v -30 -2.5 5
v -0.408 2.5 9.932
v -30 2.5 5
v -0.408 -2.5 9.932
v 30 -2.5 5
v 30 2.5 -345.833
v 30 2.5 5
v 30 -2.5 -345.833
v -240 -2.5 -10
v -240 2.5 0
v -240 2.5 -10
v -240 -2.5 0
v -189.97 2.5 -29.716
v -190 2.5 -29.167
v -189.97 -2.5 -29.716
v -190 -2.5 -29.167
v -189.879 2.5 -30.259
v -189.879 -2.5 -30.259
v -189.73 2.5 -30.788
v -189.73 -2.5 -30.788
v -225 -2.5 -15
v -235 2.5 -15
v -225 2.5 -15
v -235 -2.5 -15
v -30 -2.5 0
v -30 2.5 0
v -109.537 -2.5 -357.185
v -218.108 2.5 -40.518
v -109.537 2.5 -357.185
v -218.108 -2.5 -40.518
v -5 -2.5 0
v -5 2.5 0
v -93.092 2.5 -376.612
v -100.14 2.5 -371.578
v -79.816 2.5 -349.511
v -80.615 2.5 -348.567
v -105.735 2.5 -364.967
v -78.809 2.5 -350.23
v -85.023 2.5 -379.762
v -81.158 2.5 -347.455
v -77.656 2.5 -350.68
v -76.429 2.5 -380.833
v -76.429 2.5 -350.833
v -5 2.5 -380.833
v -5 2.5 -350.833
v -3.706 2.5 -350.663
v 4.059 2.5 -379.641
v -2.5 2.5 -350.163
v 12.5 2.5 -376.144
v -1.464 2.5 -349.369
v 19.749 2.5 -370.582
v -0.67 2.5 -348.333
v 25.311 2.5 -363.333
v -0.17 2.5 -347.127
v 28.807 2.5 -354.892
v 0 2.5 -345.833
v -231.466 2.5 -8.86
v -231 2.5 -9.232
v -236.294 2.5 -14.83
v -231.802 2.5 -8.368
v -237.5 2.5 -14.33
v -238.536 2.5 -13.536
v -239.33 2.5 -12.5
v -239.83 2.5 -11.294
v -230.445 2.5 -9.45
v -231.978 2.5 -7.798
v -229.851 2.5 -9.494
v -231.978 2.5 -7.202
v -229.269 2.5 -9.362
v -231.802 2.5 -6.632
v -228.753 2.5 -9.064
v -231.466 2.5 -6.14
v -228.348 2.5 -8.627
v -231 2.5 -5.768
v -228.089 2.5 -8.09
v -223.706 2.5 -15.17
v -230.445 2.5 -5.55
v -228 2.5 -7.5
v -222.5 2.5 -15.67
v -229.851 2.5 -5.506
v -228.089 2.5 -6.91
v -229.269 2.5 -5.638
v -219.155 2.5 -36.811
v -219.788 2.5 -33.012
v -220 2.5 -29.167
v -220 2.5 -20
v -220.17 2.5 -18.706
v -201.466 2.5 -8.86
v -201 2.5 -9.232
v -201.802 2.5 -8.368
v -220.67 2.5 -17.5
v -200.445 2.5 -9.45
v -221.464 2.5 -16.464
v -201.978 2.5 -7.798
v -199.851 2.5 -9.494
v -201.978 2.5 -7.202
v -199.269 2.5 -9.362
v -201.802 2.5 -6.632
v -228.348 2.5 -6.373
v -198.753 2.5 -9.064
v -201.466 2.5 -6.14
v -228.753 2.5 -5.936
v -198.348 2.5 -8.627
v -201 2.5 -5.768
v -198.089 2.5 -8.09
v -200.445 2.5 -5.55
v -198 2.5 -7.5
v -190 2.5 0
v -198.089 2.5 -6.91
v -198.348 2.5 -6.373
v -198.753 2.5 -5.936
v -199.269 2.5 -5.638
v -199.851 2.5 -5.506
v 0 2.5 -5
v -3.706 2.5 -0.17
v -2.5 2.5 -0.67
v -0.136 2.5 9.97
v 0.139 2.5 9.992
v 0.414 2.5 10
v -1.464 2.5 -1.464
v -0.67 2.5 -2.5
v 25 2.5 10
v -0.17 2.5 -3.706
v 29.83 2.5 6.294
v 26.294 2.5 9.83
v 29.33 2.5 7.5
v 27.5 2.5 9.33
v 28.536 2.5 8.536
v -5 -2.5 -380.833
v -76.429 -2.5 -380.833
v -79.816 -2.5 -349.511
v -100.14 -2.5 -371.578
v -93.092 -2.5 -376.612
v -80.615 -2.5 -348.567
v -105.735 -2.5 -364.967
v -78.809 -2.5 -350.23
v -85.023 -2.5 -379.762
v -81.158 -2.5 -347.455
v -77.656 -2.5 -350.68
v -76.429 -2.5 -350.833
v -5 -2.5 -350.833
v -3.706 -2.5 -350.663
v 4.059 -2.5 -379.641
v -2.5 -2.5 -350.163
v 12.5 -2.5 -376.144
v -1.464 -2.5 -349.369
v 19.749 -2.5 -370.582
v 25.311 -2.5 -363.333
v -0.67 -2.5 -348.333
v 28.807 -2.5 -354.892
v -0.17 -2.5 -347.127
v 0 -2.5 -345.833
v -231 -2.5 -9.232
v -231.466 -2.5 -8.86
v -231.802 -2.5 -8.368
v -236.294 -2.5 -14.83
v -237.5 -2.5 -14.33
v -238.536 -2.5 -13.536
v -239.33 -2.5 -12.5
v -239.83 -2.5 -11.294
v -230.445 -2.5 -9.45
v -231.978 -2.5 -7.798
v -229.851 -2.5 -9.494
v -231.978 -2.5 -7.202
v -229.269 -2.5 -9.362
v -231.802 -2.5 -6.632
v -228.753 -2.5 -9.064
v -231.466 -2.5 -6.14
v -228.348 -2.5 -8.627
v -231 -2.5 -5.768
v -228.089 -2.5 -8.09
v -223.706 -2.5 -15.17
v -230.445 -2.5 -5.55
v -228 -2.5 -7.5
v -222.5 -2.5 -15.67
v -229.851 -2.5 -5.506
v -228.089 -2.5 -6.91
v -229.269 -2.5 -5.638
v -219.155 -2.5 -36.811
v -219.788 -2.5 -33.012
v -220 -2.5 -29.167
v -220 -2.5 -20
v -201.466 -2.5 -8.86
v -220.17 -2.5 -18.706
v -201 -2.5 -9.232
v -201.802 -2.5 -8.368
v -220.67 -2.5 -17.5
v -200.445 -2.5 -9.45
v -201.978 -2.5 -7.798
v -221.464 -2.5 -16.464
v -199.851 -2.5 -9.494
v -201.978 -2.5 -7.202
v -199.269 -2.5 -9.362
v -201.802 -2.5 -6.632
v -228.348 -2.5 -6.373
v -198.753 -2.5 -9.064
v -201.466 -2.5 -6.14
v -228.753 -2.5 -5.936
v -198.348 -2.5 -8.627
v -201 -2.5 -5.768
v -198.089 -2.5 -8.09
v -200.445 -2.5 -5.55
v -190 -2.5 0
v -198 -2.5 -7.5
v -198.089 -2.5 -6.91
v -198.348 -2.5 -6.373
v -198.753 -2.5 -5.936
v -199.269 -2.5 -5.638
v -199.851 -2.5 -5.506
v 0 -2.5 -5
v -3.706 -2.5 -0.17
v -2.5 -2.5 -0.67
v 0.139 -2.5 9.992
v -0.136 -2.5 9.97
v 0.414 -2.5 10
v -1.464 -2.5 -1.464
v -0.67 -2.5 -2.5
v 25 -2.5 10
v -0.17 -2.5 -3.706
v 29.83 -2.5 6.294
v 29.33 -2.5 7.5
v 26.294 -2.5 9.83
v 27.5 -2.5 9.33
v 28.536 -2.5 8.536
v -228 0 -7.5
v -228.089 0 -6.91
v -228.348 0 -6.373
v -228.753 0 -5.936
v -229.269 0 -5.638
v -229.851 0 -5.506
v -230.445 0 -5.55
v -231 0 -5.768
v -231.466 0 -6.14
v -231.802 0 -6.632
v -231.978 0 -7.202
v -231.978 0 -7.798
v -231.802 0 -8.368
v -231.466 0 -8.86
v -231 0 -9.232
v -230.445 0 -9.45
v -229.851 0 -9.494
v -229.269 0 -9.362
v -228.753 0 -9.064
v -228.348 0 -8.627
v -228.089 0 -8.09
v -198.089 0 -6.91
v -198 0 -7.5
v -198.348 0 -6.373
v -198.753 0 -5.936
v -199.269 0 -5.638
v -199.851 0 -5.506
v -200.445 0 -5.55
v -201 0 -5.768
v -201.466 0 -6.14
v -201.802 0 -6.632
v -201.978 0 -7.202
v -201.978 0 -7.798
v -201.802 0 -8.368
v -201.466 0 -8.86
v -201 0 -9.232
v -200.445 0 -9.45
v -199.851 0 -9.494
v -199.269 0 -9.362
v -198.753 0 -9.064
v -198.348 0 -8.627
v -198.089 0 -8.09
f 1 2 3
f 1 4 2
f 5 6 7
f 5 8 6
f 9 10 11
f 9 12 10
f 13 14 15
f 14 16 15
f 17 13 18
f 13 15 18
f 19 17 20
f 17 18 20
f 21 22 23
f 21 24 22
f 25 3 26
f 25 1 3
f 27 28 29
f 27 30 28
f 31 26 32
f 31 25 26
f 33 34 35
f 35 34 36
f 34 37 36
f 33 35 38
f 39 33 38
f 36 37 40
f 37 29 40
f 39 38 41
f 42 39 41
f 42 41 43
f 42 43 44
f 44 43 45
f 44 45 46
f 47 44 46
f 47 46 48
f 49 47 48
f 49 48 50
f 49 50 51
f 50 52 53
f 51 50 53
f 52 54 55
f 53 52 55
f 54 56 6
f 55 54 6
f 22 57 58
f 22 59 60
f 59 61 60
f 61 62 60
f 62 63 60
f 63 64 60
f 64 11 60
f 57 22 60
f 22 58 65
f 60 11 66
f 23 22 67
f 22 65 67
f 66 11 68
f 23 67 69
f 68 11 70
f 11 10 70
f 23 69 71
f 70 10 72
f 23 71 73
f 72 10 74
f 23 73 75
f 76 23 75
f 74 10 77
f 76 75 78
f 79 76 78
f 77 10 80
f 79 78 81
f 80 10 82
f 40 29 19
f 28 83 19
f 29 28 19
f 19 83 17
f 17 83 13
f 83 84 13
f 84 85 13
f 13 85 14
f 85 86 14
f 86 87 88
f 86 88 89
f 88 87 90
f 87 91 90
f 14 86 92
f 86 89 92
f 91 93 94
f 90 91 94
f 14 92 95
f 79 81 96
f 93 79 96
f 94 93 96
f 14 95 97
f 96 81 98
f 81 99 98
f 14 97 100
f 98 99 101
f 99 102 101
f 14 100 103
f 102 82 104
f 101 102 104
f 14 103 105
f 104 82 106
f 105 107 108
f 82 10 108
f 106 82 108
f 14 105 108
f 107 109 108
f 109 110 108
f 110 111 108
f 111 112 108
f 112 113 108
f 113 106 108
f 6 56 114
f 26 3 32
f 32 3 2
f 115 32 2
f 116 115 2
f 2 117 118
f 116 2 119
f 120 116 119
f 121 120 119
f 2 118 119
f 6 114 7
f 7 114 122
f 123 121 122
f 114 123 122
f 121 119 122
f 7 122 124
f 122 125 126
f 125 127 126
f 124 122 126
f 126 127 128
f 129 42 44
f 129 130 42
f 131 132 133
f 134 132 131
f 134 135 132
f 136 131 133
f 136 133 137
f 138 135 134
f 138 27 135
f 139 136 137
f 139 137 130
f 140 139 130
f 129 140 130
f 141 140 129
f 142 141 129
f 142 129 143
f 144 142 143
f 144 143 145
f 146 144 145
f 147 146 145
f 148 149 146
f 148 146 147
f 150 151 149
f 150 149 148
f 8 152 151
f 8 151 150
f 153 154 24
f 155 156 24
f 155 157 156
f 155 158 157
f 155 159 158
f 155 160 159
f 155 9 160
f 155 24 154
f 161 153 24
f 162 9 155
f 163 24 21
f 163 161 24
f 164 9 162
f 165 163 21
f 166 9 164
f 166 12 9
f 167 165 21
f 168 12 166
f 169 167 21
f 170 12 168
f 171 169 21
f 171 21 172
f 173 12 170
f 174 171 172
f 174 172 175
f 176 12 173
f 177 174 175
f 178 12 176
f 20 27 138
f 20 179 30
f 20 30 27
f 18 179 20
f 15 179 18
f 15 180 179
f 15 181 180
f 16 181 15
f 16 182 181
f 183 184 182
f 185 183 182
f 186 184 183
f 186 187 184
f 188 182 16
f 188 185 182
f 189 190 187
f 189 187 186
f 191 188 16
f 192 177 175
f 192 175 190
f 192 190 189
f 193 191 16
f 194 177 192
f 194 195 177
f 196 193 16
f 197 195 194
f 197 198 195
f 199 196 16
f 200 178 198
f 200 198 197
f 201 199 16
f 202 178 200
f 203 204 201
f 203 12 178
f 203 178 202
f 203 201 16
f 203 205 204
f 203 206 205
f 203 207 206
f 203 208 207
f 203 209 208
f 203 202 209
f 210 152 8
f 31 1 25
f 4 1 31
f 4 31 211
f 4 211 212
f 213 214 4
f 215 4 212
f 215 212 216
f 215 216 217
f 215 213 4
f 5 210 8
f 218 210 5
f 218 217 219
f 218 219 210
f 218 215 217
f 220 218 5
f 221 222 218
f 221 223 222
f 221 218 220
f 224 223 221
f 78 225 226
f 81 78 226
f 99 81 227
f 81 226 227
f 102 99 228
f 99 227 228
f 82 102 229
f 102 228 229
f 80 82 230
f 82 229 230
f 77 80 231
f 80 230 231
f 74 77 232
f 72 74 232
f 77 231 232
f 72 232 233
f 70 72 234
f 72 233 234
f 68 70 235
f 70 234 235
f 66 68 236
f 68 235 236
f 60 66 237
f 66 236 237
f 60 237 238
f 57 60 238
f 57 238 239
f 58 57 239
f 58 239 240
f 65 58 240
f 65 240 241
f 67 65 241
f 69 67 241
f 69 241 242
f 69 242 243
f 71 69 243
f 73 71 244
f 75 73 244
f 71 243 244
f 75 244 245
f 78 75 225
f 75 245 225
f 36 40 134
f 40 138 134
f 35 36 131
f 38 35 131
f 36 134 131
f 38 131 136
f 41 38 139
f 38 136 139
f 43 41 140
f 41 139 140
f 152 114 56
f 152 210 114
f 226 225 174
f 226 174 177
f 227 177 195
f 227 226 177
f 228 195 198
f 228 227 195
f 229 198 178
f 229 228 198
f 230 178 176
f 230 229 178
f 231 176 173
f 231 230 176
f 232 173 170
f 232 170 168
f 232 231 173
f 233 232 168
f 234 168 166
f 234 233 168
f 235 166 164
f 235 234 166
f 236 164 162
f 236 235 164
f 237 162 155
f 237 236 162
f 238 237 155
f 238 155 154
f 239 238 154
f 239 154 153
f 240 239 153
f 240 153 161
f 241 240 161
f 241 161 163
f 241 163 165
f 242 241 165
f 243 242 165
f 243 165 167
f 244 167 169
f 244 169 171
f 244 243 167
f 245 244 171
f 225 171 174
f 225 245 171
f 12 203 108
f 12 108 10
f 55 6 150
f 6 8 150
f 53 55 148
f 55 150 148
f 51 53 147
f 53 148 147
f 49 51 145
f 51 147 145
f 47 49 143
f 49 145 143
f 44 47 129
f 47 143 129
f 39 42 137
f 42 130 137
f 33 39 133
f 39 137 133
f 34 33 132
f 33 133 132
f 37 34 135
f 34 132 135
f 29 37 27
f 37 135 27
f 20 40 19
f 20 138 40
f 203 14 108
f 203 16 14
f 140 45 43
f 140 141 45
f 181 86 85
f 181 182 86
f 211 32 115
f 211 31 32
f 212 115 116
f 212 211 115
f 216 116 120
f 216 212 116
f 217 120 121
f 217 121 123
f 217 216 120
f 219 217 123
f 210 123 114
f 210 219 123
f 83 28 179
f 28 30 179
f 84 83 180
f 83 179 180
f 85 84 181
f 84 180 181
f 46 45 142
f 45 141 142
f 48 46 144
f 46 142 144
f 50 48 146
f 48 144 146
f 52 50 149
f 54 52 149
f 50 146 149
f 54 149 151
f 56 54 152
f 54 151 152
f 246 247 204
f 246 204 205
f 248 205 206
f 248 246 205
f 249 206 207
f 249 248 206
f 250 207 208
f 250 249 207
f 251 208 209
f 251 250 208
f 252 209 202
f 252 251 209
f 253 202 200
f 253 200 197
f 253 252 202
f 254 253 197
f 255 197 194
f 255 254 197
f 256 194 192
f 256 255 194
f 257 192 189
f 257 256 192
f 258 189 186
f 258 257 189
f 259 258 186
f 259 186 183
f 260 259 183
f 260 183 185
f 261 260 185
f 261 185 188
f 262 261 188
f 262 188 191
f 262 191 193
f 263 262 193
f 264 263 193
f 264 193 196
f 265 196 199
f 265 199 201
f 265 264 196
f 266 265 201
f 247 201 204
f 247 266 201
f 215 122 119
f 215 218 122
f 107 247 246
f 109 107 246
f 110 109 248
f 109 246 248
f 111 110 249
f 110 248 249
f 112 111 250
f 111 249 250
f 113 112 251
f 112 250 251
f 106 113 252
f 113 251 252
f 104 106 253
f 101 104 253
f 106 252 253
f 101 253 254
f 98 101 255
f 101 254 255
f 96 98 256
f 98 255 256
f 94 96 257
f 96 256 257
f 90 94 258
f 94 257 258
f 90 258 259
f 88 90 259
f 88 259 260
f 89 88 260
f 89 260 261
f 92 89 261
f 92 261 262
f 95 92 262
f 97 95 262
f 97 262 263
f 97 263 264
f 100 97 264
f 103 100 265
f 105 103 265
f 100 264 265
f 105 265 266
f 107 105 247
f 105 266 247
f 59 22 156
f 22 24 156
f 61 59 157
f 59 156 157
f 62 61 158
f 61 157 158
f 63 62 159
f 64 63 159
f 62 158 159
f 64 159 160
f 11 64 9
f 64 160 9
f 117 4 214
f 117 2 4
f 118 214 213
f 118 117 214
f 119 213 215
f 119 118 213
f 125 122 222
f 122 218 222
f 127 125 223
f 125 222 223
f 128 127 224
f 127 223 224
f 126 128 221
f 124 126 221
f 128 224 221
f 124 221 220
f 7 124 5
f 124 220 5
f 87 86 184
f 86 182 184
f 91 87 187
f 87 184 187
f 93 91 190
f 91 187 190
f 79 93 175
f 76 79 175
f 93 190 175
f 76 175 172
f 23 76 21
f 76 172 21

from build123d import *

# Parameters (mm, degrees)
F1_DEPTH      = 2.5
F2_R          = 5
F3_R          = 35
F4_R          = 2
F5_DEPTH      = 2.5
F5_DEPTH_BACK = 2.5


with BuildPart() as f1:
    # F0 (on Front) → F1 (new body, symmetric)
    with BuildSketch(Plane.XZ):
        Polygon((-30, 0), (0, 0), (0, -350.8333333333), (-80, -350.8333333333), (-190, -30), (-190, 0), (-240, 0), (-240, -15), (-220, -15), (-220, -35), (-101.4285714286, -380.8333333333), (30, -380.8333333333), (30, 10), (0, 10), (-30, 5), align=None)
    extrude(amount=F1_DEPTH, both=True)

    # F2
    f2_edges = [f1.edges().sort_by_distance(p)[0] for p in [
        (-240, 0, -15),
        (-220, 0, -15),
        (30, 0, 10),
        (0, 0, 10),
        (0, 0, 0),
        (0, 0, -350.833333),
        (-80, 0, -350.833333),
        (-190, 0, -30),
    ]]
    fillet(f2_edges, radius=F2_R)

    # F3
    f3_edges = [f1.edges().sort_by_distance(p)[0] for p in [
        (-220, 0, -35),
        (-101.428571, 0, -380.833333),
        (30, 0, -380.833333),
    ]]
    fillet(f3_edges, radius=F3_R)

    # F4 (on Front) → F5 (cut, two sides)
    with BuildSketch(Plane.XZ) as f5_sk:
        with Locations((-230, -7.5)):
            Circle(F4_R)
        with Locations((-200, -7.5)):
            Circle(F4_R)
    extrude(amount=F5_DEPTH, mode=Mode.SUBTRACT)
    extrude(f5_sk.sketch, amount=-F5_DEPTH_BACK, mode=Mode.SUBTRACT)


solid = f1.part
